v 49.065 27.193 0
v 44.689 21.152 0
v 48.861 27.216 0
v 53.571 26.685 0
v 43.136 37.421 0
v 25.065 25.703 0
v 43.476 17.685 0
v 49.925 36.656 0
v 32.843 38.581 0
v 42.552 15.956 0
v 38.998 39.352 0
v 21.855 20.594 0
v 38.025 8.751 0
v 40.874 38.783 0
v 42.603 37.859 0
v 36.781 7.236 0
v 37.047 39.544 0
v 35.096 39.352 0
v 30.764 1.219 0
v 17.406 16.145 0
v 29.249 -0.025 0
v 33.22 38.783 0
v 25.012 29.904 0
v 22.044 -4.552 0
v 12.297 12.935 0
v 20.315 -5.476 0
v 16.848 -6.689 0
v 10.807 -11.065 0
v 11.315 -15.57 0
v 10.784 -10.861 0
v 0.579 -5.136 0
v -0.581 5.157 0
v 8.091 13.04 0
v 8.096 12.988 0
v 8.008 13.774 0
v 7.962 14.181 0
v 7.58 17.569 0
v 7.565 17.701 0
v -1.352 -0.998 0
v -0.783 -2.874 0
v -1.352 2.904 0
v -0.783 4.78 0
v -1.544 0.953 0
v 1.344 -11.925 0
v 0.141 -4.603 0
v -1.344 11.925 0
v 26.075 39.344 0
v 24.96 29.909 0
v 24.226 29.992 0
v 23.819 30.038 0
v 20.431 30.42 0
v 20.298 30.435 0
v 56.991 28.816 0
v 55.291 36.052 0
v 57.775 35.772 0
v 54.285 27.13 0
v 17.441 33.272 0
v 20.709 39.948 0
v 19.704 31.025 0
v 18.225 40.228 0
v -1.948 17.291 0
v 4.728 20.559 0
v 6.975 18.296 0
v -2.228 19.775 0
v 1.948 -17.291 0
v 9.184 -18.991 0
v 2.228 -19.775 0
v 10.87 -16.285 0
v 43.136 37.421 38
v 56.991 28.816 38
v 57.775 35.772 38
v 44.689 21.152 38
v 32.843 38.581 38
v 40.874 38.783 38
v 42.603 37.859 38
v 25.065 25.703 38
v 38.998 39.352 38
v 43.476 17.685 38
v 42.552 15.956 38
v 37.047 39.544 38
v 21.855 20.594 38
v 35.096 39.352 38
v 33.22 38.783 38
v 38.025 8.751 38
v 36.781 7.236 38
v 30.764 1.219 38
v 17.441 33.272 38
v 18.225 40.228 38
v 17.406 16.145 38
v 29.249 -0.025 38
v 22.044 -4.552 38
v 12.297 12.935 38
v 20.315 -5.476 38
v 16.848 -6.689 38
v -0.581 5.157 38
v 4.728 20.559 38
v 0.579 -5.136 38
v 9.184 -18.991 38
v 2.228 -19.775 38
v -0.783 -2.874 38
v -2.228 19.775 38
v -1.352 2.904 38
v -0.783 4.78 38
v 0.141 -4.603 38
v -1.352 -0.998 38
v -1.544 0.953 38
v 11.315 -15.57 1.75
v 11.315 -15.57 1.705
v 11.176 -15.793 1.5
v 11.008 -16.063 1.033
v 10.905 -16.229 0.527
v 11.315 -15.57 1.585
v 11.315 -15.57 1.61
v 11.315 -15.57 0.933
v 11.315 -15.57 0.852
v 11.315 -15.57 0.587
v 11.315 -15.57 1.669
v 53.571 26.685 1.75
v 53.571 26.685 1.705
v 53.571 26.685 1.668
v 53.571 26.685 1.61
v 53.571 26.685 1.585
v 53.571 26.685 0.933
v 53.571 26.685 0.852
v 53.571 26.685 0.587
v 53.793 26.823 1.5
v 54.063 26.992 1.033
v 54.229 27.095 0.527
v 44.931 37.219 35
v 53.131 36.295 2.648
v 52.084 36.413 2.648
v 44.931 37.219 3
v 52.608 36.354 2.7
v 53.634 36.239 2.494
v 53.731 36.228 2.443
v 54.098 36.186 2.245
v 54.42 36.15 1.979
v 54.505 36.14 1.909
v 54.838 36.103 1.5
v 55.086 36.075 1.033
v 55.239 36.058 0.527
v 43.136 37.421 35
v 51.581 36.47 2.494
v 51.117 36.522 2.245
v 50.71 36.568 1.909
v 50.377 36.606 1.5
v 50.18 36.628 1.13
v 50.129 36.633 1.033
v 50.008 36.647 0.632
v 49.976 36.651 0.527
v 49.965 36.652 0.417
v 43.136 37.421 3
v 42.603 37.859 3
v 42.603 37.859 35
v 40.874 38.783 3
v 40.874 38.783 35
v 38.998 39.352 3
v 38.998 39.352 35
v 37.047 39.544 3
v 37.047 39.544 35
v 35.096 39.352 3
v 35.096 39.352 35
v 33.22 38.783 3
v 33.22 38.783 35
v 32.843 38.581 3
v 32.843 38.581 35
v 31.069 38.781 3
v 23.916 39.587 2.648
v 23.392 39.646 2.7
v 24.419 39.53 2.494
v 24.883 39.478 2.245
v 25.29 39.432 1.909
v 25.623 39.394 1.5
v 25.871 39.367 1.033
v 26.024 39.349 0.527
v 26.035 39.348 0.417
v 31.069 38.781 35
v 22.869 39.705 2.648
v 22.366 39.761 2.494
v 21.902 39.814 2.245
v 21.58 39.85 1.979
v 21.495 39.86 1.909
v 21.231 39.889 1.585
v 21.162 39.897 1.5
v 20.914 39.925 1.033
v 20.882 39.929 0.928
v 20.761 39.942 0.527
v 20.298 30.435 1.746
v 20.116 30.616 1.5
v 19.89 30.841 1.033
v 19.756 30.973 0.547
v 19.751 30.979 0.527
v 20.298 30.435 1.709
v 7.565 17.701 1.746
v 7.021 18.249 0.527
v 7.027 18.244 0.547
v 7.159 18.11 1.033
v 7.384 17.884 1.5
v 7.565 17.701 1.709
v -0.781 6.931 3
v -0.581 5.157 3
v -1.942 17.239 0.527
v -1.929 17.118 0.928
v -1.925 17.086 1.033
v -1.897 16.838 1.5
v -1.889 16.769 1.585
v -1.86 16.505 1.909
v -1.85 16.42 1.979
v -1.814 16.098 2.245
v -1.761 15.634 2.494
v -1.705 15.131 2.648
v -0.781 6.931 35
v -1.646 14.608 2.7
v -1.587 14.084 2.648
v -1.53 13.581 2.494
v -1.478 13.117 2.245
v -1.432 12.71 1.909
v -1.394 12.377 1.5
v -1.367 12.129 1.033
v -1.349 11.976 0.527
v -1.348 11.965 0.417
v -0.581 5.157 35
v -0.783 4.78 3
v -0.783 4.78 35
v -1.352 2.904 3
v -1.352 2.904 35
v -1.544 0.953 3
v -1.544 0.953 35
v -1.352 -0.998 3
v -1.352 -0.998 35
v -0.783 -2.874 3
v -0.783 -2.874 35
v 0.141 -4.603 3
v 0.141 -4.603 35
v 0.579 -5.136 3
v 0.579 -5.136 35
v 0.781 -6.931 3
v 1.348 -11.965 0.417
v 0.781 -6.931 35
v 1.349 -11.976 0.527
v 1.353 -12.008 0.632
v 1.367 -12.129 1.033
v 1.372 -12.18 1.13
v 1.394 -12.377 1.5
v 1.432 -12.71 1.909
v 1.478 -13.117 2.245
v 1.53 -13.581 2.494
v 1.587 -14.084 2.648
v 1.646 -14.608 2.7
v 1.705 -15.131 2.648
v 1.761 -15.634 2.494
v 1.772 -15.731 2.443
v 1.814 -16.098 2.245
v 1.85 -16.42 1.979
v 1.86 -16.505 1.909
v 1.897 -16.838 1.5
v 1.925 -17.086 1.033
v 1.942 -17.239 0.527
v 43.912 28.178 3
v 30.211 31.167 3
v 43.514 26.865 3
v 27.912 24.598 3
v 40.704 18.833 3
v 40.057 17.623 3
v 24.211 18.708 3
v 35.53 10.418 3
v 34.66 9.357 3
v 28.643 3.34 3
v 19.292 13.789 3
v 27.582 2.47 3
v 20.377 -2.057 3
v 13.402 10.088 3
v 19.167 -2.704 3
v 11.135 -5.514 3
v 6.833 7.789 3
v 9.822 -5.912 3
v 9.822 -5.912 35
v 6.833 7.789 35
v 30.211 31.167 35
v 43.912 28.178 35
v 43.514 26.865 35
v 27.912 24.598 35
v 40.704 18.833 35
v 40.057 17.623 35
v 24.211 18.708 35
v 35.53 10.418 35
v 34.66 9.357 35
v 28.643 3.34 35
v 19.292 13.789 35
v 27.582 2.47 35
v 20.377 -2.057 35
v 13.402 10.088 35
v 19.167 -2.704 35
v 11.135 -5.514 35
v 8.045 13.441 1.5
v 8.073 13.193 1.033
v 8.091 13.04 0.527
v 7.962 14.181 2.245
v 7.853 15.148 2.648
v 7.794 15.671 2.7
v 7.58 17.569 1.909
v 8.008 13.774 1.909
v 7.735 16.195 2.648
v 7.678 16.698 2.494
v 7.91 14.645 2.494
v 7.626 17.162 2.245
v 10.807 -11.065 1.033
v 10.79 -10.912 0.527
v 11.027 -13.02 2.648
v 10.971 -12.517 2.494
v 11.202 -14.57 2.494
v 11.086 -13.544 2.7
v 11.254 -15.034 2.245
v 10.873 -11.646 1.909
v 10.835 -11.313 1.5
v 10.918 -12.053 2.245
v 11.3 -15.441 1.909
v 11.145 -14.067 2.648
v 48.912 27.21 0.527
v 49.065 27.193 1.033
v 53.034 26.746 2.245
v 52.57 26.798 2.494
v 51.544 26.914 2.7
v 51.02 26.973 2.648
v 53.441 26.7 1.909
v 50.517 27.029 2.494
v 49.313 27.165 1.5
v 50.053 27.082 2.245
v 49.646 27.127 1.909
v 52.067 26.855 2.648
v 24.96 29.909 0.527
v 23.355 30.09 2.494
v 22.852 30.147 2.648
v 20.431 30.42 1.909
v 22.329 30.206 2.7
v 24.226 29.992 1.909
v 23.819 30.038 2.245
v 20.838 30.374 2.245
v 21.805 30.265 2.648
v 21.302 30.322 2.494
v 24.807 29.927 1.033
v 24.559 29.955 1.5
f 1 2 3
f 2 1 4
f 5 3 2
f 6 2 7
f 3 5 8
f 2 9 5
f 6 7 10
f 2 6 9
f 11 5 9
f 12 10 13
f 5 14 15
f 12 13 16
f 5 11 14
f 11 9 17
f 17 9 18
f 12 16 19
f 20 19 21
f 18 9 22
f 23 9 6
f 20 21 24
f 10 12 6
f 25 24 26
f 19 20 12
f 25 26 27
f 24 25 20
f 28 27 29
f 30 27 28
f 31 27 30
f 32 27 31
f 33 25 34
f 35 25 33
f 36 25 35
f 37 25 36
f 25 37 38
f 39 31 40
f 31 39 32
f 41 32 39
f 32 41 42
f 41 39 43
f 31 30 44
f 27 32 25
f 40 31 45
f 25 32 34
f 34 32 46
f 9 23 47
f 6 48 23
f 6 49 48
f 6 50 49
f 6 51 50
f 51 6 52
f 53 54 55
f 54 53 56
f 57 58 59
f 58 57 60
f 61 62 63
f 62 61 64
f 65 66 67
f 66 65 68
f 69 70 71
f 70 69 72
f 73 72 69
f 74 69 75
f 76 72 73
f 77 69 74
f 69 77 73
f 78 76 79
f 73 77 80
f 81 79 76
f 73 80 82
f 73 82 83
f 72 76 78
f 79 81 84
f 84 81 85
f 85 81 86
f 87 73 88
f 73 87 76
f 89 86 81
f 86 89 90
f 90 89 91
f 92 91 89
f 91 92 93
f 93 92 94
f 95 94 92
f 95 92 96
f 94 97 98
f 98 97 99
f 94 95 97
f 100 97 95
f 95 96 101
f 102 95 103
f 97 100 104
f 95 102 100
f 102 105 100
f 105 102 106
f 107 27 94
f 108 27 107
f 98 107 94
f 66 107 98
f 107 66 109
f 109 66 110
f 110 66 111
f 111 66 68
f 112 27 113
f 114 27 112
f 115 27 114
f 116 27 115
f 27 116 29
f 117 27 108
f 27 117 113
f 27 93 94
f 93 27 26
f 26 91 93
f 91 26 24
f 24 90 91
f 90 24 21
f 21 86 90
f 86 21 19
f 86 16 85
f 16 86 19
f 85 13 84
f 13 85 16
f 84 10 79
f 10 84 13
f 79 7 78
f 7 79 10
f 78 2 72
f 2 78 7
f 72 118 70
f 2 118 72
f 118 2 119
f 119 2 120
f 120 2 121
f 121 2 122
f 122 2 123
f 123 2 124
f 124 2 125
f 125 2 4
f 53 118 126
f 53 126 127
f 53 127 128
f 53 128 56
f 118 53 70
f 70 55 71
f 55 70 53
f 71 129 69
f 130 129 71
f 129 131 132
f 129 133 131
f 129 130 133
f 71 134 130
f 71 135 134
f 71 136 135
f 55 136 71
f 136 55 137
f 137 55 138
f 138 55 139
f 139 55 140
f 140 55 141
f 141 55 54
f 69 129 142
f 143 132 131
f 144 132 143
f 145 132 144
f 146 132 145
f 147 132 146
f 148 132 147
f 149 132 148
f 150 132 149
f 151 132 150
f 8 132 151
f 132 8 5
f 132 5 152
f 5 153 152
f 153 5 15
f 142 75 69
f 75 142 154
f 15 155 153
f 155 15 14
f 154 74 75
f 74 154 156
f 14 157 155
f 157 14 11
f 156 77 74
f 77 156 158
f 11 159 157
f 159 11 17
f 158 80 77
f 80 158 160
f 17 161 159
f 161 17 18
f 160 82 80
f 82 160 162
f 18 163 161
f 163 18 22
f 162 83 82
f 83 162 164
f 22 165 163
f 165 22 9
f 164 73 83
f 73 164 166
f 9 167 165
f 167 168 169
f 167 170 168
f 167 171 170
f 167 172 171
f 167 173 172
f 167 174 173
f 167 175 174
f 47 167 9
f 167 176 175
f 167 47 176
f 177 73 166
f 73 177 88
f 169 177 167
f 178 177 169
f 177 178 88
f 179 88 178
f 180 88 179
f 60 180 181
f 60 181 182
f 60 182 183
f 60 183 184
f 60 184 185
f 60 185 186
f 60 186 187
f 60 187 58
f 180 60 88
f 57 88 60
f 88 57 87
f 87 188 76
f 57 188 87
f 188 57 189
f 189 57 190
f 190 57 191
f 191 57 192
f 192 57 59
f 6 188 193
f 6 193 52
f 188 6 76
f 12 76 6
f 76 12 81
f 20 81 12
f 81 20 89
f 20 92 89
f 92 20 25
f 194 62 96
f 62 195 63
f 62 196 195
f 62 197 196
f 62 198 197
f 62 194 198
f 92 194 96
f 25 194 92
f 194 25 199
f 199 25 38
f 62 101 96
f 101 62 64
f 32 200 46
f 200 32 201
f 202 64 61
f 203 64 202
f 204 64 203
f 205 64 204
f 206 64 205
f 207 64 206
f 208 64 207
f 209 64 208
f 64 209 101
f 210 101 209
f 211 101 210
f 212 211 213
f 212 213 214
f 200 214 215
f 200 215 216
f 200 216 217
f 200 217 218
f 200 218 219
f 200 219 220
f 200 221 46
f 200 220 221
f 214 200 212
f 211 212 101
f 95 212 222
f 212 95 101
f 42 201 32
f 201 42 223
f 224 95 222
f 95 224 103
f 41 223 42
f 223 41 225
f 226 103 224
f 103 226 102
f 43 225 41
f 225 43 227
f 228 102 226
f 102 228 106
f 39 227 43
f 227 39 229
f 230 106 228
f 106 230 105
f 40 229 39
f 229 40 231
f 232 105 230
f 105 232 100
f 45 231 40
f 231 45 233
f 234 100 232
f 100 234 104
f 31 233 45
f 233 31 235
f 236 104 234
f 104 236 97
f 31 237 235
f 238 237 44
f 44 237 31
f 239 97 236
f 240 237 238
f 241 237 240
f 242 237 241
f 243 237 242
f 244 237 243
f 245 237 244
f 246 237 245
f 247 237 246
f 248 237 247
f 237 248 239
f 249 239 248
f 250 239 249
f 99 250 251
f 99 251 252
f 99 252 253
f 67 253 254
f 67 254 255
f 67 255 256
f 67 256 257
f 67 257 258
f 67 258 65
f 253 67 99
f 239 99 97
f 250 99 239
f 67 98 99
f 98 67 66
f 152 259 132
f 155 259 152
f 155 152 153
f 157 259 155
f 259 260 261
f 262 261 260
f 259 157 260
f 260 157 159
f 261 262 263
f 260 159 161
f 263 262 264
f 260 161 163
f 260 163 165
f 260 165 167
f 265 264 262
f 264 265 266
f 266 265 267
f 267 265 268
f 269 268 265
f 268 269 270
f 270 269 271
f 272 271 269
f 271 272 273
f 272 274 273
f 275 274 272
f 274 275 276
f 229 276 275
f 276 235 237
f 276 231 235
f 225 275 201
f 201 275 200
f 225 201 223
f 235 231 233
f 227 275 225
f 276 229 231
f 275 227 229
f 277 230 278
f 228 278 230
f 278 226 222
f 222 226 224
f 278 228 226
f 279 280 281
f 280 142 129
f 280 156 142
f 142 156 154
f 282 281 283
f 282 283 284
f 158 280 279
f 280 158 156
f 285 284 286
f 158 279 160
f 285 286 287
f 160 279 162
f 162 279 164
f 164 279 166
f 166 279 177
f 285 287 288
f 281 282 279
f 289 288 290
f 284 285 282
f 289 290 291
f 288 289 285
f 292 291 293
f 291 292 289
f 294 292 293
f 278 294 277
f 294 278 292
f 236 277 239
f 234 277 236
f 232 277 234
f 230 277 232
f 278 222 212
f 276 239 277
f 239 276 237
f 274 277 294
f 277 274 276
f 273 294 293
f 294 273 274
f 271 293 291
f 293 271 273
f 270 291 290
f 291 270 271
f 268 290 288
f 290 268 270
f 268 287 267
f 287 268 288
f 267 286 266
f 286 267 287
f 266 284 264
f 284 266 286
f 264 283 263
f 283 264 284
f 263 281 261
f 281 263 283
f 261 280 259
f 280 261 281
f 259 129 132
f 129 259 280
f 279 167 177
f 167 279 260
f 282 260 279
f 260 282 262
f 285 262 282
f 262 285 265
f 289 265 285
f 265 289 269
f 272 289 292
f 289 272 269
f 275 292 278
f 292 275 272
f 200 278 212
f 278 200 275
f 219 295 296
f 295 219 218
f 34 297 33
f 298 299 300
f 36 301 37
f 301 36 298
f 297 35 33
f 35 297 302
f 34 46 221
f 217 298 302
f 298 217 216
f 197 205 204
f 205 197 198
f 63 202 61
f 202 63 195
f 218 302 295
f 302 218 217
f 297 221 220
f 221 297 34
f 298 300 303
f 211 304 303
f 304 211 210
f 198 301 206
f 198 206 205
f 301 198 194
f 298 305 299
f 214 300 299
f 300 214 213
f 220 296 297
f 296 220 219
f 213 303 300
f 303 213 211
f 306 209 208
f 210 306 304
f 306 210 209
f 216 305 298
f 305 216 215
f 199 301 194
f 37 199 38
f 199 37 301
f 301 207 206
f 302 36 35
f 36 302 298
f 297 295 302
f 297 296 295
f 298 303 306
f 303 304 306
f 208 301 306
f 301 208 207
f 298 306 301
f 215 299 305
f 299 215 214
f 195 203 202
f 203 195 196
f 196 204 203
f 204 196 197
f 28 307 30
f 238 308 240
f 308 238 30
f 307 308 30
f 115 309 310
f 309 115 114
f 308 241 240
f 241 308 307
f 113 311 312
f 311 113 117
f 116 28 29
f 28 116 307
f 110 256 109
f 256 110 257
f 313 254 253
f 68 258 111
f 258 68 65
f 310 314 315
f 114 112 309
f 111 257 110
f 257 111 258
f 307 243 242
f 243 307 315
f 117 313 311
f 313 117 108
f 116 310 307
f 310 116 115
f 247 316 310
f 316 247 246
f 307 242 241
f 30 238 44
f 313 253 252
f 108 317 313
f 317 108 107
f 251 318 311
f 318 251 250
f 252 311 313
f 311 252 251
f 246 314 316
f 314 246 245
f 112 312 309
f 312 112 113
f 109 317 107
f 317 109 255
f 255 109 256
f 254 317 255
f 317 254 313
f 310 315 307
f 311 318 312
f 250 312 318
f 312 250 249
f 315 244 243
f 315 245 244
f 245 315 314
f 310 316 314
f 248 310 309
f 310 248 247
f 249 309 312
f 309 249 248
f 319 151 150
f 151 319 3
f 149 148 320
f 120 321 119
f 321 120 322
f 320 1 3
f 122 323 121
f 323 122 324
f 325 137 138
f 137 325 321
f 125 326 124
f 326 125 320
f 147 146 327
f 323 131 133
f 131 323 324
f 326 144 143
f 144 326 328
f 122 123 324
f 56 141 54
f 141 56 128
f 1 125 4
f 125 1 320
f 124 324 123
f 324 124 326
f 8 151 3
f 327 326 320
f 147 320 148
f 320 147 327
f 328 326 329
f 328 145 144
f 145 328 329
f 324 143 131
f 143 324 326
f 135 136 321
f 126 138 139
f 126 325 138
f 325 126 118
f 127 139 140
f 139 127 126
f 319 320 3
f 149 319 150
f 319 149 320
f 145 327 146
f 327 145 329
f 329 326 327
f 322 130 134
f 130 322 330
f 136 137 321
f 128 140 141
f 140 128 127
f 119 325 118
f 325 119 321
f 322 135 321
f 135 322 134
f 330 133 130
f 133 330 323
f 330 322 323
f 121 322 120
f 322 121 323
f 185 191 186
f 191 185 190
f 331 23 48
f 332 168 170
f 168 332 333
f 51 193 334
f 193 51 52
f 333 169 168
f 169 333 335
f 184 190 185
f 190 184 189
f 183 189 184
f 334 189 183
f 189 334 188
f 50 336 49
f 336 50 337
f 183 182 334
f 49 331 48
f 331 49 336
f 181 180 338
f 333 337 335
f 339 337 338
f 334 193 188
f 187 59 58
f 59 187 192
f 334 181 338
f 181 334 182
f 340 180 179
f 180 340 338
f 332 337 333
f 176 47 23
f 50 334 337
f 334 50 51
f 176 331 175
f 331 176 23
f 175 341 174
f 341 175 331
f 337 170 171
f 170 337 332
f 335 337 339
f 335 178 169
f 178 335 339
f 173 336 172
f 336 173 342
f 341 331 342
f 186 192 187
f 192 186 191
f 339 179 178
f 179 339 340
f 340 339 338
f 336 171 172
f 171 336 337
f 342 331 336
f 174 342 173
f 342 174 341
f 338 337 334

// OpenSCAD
$fn = 32;

// ----------------------------------------------------------------------
// Air duct: 20 mm duct, 3 mm wall, 38 mm across
// ----------------------------------------------------------------------

// --- parameters (mm) ---
duct_r = 10;              // duct core radius
duct_d = 20;              // duct core diameter
wall = 3;                 // duct wall thickness
height = 38;              // duct width (extrusion height)
port_r = 19.9;            // port flange half width
port_d = 39.8;            // port flange width
port_t = 7;               // port flange thickness
bolt_d = 5.4;             // port bolt holes
bolt_offset = 14.7;       // bolt hole offset from the port axis

difference() {
  /* outer hull chain: tube with a flat flange plate at every port */
  linear_extrude(height = 38) {
    hull() {
      polygon([[2.228, -19.775], [-2.228, 19.775], [4.728, 20.559], [9.184, -18.991]]);
      translate([9.937, 1.12]) circle(r = 10);
    }
    hull() {
      translate([9.937, 1.12]) circle(r = 10);
      translate([8.456, 0.953]) circle(r = 10);
    }
    hull() {
      translate([8.456, 0.953]) circle(r = 10);
      translate([16.488, 3.763]) circle(r = 10);
    }
    hull() {
      translate([16.488, 3.763]) circle(r = 10);
      translate([23.693, 8.29]) circle(r = 10);
    }
    hull() {
      translate([23.693, 8.29]) circle(r = 10);
      translate([29.71, 14.307]) circle(r = 10);
    }
    hull() {
      translate([29.71, 14.307]) circle(r = 10);
      translate([34.237, 21.512]) circle(r = 10);
    }
    hull() {
      translate([34.237, 21.512]) circle(r = 10);
      translate([37.047, 29.544]) circle(r = 10);
    }
    hull() {
      translate([37.047, 29.544]) circle(r = 10);
      translate([36.88, 28.063]) circle(r = 10);
    }
    hull() {
      translate([36.88, 28.063]) circle(r = 10);
      polygon([[18.225, 40.228], [57.775, 35.772], [56.991, 28.816], [17.441, 33.272]]);
    }
  }
  /* air passage: the same chain inset by the wall, 5 mm proud of the ports */
  translate([0, 0, 3]) linear_extrude(height = 32) {
    hull() {
      translate([-4.969, -0.56]) circle(r = 7);
      translate([8.456, 0.953]) circle(r = 7);
    }
    hull() {
      translate([8.456, 0.953]) circle(r = 7);
      translate([16.488, 3.763]) circle(r = 7);
    }
    hull() {
      translate([16.488, 3.763]) circle(r = 7);
      translate([23.693, 8.29]) circle(r = 7);
    }
    hull() {
      translate([23.693, 8.29]) circle(r = 7);
      translate([29.71, 14.307]) circle(r = 7);
    }
    hull() {
      translate([29.71, 14.307]) circle(r = 7);
      translate([34.237, 21.512]) circle(r = 7);
    }
    hull() {
      translate([34.237, 21.512]) circle(r = 7);
      translate([37.047, 29.544]) circle(r = 7);
    }
    hull() {
      translate([37.047, 29.544]) circle(r = 7);
      translate([38.56, 42.969]) circle(r = 7);
    }
  }
  translate([0, 0]) rotate([0, 0, -83.57]) translate([-14.7, -2.5]) rotate([-90, 0, 0]) cylinder(h = 12, d = 5.4);
  translate([0, 0]) rotate([0, 0, -83.57]) translate([14.7, -2.5]) rotate([-90, 0, 0]) cylinder(h = 12, d = 5.4);
  translate([38, 38]) rotate([0, 0, 173.57]) translate([-14.7, -2.5]) rotate([-90, 0, 0]) cylinder(h = 12, d = 5.4);
  translate([38, 38]) rotate([0, 0, 173.57]) translate([14.7, -2.5]) rotate([-90, 0, 0]) cylinder(h = 12, d = 5.4);
}
